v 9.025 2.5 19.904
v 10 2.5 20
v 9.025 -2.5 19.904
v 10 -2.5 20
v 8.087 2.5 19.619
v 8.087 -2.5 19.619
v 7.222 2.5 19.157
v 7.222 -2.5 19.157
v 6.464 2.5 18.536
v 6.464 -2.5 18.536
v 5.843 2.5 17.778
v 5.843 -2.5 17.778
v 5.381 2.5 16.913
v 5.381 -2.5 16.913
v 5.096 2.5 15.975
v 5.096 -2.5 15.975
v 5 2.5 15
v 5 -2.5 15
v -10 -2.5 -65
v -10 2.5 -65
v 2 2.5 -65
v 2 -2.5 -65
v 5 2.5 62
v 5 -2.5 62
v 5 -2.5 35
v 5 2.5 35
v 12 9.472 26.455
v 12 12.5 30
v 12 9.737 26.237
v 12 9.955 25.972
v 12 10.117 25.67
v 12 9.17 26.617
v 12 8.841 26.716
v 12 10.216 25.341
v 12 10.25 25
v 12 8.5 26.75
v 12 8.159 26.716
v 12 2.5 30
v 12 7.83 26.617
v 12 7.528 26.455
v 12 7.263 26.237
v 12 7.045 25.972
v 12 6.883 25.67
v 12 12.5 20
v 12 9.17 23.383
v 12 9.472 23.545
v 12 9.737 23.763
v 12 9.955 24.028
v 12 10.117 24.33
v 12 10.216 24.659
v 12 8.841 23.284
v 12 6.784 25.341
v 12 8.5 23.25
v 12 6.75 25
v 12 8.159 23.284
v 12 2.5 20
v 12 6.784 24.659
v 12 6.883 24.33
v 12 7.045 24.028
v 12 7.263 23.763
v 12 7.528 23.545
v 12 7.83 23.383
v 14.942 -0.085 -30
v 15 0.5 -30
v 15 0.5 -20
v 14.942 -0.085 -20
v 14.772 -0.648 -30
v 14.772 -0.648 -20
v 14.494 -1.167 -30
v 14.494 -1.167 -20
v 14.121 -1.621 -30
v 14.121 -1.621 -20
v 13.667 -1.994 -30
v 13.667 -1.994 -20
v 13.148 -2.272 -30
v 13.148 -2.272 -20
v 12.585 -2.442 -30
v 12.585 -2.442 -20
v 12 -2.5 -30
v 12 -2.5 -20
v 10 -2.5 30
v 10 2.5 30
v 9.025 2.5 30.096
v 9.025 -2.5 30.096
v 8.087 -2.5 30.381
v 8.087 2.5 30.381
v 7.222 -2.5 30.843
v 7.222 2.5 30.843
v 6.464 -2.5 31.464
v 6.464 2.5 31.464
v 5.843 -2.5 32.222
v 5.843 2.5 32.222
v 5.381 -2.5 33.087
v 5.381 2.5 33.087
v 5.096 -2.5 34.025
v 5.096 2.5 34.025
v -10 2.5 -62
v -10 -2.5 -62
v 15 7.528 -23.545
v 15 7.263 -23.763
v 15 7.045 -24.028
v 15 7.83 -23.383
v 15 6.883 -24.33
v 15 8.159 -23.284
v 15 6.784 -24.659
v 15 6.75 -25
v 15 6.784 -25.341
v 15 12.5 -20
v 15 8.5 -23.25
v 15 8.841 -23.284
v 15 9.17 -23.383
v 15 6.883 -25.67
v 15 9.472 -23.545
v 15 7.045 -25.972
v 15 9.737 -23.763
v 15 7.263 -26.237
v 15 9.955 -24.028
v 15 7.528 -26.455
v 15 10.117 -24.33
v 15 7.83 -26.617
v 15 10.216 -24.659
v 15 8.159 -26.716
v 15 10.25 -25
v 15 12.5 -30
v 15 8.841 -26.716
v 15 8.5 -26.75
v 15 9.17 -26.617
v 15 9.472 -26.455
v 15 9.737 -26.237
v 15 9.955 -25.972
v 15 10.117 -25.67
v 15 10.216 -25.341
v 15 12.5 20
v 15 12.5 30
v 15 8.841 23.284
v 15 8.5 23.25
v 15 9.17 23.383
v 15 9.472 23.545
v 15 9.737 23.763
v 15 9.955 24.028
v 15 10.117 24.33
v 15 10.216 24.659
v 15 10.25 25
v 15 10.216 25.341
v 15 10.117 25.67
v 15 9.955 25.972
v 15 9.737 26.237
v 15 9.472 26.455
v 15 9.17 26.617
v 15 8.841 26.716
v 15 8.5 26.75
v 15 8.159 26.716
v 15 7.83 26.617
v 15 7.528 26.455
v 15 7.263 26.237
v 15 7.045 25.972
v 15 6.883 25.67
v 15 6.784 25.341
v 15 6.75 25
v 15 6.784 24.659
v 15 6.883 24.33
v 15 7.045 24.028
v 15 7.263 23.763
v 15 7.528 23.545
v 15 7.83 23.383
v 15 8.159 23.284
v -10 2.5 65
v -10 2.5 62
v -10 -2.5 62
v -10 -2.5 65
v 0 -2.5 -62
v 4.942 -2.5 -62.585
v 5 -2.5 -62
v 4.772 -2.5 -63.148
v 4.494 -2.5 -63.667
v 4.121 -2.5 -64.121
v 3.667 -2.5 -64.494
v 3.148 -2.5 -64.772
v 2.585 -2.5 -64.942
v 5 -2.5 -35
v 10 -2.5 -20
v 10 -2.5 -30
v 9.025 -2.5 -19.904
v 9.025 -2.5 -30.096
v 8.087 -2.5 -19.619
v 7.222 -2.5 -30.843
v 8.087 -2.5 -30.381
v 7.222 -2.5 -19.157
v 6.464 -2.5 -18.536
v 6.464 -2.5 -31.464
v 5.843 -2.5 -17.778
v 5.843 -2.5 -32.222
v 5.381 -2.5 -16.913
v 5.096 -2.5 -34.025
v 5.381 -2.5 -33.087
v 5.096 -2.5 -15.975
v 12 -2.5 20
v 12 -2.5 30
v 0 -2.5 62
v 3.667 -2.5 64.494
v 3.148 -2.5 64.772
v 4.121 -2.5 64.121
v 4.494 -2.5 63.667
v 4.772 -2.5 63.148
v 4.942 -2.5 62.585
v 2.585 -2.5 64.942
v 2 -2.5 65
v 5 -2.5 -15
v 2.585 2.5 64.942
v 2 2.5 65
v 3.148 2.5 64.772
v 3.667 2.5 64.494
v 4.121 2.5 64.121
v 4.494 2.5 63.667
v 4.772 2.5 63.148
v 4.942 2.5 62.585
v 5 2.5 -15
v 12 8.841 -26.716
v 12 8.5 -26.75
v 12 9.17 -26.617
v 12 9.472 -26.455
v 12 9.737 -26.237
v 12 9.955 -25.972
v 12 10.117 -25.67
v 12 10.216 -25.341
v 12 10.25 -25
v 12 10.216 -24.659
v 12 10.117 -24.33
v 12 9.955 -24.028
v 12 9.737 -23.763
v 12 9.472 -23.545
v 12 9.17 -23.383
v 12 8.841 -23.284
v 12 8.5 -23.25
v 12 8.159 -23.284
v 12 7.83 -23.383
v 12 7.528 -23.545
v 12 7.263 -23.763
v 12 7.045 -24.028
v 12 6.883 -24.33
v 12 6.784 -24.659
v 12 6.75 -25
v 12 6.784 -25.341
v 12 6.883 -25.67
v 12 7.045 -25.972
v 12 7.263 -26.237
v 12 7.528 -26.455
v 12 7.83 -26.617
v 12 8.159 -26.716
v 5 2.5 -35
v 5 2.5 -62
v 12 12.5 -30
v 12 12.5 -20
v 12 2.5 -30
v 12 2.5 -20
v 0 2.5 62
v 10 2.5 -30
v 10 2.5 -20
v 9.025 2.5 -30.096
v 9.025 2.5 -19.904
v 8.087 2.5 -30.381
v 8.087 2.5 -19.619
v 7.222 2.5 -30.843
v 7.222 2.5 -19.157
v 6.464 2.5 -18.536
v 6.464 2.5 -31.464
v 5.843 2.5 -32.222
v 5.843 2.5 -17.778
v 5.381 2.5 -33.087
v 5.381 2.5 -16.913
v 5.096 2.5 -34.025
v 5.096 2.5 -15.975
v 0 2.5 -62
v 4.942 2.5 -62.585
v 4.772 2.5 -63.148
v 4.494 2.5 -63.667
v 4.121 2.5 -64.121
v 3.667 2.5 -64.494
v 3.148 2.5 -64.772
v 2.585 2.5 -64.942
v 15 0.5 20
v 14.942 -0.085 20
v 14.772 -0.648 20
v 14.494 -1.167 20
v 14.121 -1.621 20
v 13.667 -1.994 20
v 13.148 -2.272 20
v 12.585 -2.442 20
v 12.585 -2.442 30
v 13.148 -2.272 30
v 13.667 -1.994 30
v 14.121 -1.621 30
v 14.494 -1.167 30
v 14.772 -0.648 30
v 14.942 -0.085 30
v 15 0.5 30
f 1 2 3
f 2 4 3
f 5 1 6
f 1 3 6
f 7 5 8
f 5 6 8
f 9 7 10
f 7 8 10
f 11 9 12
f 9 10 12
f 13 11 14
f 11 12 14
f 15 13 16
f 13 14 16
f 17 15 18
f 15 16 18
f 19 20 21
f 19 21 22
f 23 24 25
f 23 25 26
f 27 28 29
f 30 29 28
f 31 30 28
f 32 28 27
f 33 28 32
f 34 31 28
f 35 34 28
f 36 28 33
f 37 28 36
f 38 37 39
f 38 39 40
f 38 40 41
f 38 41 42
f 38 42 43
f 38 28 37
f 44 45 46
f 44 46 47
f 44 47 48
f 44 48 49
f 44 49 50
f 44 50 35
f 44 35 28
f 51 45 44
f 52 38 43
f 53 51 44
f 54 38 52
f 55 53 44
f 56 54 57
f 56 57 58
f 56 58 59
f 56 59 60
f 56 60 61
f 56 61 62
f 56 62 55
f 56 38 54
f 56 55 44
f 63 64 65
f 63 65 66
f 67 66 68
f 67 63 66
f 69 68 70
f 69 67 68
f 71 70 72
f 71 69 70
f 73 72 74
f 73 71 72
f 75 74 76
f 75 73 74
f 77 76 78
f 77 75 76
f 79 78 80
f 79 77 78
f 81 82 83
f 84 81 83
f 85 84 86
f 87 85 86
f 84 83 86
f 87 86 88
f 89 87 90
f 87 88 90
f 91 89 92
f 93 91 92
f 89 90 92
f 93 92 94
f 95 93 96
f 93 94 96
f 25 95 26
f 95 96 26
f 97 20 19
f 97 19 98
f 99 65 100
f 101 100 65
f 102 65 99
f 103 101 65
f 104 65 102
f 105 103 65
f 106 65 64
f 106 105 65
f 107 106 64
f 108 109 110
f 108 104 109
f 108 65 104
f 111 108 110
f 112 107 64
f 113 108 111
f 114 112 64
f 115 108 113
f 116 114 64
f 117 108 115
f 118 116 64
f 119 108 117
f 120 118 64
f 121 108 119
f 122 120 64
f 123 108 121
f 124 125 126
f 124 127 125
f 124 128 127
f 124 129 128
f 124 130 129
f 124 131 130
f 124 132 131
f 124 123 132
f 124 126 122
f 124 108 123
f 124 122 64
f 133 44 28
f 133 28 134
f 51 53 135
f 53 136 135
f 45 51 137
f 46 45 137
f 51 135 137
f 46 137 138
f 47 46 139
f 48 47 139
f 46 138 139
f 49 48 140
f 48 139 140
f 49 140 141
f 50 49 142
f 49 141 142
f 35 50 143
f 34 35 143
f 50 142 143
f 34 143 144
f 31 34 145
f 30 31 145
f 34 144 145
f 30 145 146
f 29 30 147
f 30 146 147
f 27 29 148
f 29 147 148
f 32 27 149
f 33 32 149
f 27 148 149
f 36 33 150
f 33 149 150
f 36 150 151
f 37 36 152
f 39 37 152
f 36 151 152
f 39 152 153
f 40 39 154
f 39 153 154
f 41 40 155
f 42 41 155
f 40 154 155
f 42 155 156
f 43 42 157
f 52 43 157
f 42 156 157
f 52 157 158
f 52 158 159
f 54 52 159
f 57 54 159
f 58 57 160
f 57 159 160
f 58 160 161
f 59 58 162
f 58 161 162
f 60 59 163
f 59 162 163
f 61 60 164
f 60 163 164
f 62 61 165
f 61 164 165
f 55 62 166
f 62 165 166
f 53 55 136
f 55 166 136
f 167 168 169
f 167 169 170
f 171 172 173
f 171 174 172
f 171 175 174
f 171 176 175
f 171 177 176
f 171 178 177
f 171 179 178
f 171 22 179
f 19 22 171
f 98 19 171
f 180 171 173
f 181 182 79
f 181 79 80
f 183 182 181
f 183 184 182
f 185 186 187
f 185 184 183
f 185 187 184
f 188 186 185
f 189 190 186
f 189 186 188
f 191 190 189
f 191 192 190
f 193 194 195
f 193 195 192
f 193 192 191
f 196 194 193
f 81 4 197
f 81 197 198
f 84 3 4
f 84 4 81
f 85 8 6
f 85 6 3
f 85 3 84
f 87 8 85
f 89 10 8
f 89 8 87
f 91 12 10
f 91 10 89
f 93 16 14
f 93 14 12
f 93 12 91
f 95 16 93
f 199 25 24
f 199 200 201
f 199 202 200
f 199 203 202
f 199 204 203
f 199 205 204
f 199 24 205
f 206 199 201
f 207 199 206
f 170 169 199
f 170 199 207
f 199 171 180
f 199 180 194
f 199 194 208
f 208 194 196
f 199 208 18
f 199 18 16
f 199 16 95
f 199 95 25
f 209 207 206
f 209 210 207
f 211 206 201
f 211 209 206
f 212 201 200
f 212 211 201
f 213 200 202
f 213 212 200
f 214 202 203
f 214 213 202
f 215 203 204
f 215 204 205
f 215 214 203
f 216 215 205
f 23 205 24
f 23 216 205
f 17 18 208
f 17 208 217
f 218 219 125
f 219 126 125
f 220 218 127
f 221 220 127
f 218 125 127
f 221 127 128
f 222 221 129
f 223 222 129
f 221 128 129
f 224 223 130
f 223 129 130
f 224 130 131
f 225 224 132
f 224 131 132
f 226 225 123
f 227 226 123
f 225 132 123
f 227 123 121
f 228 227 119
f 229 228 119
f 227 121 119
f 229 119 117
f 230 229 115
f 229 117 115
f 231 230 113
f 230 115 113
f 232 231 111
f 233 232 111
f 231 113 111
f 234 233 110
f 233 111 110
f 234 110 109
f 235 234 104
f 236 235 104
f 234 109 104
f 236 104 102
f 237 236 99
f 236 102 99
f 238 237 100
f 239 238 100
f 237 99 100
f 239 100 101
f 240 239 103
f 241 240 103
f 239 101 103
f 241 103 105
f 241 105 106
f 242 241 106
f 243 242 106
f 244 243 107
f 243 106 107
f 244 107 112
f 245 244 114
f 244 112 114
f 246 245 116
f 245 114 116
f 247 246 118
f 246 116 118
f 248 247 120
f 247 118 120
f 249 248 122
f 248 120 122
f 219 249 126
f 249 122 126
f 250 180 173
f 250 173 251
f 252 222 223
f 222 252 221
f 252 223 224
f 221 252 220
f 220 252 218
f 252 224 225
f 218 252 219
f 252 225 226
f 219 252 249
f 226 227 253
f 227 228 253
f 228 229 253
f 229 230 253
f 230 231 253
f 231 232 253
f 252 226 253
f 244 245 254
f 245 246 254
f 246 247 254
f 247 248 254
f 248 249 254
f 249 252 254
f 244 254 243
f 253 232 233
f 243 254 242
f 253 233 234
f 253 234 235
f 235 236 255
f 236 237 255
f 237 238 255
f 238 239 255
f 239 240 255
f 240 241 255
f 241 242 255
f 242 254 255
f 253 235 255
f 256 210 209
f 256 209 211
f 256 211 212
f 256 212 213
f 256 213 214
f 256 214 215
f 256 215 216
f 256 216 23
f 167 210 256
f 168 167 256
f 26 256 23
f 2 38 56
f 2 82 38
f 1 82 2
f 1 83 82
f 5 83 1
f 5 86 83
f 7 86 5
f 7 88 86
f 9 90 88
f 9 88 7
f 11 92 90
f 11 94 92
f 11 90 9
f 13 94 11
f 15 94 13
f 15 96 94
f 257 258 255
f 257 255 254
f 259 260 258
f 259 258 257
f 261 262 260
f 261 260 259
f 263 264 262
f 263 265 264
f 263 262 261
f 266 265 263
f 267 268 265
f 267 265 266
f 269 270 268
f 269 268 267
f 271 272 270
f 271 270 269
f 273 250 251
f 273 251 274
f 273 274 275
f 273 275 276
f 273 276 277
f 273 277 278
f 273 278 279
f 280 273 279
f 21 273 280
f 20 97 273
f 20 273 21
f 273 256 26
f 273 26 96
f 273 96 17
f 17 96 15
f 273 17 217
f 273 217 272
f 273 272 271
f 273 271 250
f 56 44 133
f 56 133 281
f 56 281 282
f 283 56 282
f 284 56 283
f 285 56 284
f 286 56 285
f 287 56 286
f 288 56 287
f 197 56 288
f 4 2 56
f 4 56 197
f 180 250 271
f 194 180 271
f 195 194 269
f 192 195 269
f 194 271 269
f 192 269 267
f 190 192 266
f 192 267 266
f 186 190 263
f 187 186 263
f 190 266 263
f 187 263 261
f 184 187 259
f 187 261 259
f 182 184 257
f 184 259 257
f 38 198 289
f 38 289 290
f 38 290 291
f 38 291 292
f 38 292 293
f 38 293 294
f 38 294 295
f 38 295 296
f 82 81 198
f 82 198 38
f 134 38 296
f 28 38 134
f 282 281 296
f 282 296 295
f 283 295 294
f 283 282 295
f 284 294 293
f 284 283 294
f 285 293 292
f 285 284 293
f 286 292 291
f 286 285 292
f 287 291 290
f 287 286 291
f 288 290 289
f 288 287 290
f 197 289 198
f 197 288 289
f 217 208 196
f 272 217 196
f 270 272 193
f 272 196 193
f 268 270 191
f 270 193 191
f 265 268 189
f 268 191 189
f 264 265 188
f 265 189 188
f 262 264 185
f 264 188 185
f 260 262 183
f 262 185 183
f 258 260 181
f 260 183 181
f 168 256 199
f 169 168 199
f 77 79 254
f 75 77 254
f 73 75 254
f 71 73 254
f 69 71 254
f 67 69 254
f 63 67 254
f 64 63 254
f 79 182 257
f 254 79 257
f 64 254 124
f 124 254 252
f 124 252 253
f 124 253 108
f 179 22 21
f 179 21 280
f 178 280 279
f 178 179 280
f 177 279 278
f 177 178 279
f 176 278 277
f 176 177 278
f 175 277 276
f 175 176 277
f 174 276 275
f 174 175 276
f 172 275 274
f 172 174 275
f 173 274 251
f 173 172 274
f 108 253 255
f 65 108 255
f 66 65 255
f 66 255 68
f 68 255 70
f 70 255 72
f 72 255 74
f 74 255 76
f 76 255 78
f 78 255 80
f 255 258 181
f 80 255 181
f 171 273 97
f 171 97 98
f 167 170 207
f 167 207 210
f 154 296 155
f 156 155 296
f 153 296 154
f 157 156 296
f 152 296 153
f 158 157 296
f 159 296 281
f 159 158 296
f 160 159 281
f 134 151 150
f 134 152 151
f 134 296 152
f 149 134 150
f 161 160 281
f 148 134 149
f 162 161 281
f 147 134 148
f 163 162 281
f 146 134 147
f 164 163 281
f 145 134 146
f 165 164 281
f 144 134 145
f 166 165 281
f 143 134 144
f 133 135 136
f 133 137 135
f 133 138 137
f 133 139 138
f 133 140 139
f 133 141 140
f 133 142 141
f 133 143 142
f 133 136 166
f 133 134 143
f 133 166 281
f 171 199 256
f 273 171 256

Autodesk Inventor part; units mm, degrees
ref_plane "YZ Plane" through (0, 0, 0) normal (1, 0, 0) x (0, 1, 0)
ref_plane "XZ Plane" through (0, 0, 0) normal (0, 1, 0) x (-1, 0, 0)
ref_plane "XY Plane" through (0, 0, 0) normal (0, 0, 1) x (1, 0, 0)
sketch "Esquisse1" plane through (0, 0, 0) normal (1, 0, 0) x (0, 1, 0)
  line L0 (-2.5, 65) -> (2.5, 65)
  line L1 (2.5, 65) -> (2.5, -65)
  line L2 (2.5, -65) -> (-2.5, -65)
  line L3 (-2.5, -65) -> (-2.5, 65)
  line L4 (2.5, 65) -> (-2.5, -65)
  line L5 (2.5, -65) -> (-2.5, 65)
  point P0 (0, 0)
  point P1 (0, 0)
  point P2 (0, 0)
  dimension "d0" = 130
  dimension "d1" = 5
extrude "Extrusion1" add sketch "Esquisse1" along normal blind 5
sketch "Esquisse2" plane through (5, 0, 0) normal (1, 0, 0) x (0, 0, -1)
  line L0 (65, 2.5) -> (-65, 2.5) projected
  line L1 (-65, -2.5) -> (65, -2.5) projected
  line L2 (-30, 2.5) -> (-20, 2.5)
  line L3 (-20, 2.5) -> (-20, -2.5)
  line L4 (-20, -2.5) -> (-30, -2.5)
  line L5 (-30, -2.5) -> (-30, 2.5)
  line L6 (0, 13) -> (0, -16)
  line L7 (30, 2.5) -> (20, 2.5)
  line L8 (20, 2.5) -> (20, -2.5)
  line L9 (20, -2.5) -> (30, -2.5)
  line L10 (30, -2.5) -> (30, 2.5)
  point P0 (0, 0)
  point P1 (-20, 2.5)
  point P2 (30, -2.5)
  point P3 (30, 2.5)
  point P4 (20, 2.5)
  point P5 (20, -2.5)
  dimension "d4" = 10
  dimension "d5" = 20
extrude "Extrusion2" add sketch "Esquisse2" along normal blind 10 contours L10 L1 L8 L0 | L3 L1 L5 L0
sketch "Esquisse3" plane through (0, 2.5, 65) normal (0, 1, 0) x (1, 0, 0)
  line L0 (15, 45) -> (15, 35) projected
  line L1 (5, 45) -> (15, 45) projected
  line L2 (15, 35) -> (12, 35)
  line L3 (12, 35) -> (12, 45)
  line L4 (12, 45) -> (15, 45)
  line L5 (15, 45) -> (15, 35)
  line L6 (-9, 65) -> (24, 65)
  line L7 (15, 85) -> (15, 95)
  line L8 (15, 95) -> (12, 95)
  line L9 (12, 95) -> (12, 85)
  line L10 (12, 85) -> (15, 85)
  line L11 (15, 85) -> (15, 95)
  point P0 (0, 65)
extrude "Extrusion3" add sketch "Esquisse3" along normal blind 10
sketch "Esquisse4" plane through (15, 0, 0) normal (1, 0, 0) x (0, 0, -1)
  circle A0 centre (-25, 8.5) radius 1.75
  line L0 (0, 20) -> (0, -21)
  circle A1 centre (25, 8.5) radius 1.75
  line L1 (-30, 12.5) -> (-20, 12.5) projected
  line L2 (-20, -2.5) -> (-20, 12.5) projected
  point P0 (0, 0)
  dimension "d10" = 3.5
  dimension "d11" = 4
  dimension "d19" = 5
extrude "Extrusion4" cut sketch "Esquisse4" against normal blind 10
fillet "Congé1" radius 5 4 edges at (5, 0, 30) (5, 0, -20) (5, 0, 20) (5, 0, -30)
fillet "Congé2" radius 3 2 edges at (15, -2.5, 25) (15, -2.5, -25)
fillet "Congé3" radius 3 2 edges at (5, 0, -65) (5, 0, 65)
sketch "Esquisse5" plane through (0, 0, 0) normal (-1, 0, 0) x (0, 0, 1)
  line L0 (-65, 2.5) -> (65, 2.5) projected
  line L1 (65, -2.5) -> (-65, -2.5) projected
  line L2 (-65, 2.5) -> (-62, 2.5)
  line L3 (-62, 2.5) -> (-62, -2.5)
  line L4 (-62, -2.5) -> (-65, -2.5)
  line L5 (-65, -2.5) -> (-65, 2.5)
  line L6 (0, 19) -> (0, -21)
  line L7 (65, 2.5) -> (62, 2.5)
  line L8 (62, 2.5) -> (62, -2.5)
  line L9 (62, -2.5) -> (65, -2.5)
  line L10 (65, -2.5) -> (65, 2.5)
  point P0 (0, 0)
  point P1 (65, -2.5)
extrude "Extrusion5" add sketch "Esquisse5" along normal blind 10 contours L0 L3 L1 L5 | L0 L10 L1 L8
properties part number "pare-chocs"
